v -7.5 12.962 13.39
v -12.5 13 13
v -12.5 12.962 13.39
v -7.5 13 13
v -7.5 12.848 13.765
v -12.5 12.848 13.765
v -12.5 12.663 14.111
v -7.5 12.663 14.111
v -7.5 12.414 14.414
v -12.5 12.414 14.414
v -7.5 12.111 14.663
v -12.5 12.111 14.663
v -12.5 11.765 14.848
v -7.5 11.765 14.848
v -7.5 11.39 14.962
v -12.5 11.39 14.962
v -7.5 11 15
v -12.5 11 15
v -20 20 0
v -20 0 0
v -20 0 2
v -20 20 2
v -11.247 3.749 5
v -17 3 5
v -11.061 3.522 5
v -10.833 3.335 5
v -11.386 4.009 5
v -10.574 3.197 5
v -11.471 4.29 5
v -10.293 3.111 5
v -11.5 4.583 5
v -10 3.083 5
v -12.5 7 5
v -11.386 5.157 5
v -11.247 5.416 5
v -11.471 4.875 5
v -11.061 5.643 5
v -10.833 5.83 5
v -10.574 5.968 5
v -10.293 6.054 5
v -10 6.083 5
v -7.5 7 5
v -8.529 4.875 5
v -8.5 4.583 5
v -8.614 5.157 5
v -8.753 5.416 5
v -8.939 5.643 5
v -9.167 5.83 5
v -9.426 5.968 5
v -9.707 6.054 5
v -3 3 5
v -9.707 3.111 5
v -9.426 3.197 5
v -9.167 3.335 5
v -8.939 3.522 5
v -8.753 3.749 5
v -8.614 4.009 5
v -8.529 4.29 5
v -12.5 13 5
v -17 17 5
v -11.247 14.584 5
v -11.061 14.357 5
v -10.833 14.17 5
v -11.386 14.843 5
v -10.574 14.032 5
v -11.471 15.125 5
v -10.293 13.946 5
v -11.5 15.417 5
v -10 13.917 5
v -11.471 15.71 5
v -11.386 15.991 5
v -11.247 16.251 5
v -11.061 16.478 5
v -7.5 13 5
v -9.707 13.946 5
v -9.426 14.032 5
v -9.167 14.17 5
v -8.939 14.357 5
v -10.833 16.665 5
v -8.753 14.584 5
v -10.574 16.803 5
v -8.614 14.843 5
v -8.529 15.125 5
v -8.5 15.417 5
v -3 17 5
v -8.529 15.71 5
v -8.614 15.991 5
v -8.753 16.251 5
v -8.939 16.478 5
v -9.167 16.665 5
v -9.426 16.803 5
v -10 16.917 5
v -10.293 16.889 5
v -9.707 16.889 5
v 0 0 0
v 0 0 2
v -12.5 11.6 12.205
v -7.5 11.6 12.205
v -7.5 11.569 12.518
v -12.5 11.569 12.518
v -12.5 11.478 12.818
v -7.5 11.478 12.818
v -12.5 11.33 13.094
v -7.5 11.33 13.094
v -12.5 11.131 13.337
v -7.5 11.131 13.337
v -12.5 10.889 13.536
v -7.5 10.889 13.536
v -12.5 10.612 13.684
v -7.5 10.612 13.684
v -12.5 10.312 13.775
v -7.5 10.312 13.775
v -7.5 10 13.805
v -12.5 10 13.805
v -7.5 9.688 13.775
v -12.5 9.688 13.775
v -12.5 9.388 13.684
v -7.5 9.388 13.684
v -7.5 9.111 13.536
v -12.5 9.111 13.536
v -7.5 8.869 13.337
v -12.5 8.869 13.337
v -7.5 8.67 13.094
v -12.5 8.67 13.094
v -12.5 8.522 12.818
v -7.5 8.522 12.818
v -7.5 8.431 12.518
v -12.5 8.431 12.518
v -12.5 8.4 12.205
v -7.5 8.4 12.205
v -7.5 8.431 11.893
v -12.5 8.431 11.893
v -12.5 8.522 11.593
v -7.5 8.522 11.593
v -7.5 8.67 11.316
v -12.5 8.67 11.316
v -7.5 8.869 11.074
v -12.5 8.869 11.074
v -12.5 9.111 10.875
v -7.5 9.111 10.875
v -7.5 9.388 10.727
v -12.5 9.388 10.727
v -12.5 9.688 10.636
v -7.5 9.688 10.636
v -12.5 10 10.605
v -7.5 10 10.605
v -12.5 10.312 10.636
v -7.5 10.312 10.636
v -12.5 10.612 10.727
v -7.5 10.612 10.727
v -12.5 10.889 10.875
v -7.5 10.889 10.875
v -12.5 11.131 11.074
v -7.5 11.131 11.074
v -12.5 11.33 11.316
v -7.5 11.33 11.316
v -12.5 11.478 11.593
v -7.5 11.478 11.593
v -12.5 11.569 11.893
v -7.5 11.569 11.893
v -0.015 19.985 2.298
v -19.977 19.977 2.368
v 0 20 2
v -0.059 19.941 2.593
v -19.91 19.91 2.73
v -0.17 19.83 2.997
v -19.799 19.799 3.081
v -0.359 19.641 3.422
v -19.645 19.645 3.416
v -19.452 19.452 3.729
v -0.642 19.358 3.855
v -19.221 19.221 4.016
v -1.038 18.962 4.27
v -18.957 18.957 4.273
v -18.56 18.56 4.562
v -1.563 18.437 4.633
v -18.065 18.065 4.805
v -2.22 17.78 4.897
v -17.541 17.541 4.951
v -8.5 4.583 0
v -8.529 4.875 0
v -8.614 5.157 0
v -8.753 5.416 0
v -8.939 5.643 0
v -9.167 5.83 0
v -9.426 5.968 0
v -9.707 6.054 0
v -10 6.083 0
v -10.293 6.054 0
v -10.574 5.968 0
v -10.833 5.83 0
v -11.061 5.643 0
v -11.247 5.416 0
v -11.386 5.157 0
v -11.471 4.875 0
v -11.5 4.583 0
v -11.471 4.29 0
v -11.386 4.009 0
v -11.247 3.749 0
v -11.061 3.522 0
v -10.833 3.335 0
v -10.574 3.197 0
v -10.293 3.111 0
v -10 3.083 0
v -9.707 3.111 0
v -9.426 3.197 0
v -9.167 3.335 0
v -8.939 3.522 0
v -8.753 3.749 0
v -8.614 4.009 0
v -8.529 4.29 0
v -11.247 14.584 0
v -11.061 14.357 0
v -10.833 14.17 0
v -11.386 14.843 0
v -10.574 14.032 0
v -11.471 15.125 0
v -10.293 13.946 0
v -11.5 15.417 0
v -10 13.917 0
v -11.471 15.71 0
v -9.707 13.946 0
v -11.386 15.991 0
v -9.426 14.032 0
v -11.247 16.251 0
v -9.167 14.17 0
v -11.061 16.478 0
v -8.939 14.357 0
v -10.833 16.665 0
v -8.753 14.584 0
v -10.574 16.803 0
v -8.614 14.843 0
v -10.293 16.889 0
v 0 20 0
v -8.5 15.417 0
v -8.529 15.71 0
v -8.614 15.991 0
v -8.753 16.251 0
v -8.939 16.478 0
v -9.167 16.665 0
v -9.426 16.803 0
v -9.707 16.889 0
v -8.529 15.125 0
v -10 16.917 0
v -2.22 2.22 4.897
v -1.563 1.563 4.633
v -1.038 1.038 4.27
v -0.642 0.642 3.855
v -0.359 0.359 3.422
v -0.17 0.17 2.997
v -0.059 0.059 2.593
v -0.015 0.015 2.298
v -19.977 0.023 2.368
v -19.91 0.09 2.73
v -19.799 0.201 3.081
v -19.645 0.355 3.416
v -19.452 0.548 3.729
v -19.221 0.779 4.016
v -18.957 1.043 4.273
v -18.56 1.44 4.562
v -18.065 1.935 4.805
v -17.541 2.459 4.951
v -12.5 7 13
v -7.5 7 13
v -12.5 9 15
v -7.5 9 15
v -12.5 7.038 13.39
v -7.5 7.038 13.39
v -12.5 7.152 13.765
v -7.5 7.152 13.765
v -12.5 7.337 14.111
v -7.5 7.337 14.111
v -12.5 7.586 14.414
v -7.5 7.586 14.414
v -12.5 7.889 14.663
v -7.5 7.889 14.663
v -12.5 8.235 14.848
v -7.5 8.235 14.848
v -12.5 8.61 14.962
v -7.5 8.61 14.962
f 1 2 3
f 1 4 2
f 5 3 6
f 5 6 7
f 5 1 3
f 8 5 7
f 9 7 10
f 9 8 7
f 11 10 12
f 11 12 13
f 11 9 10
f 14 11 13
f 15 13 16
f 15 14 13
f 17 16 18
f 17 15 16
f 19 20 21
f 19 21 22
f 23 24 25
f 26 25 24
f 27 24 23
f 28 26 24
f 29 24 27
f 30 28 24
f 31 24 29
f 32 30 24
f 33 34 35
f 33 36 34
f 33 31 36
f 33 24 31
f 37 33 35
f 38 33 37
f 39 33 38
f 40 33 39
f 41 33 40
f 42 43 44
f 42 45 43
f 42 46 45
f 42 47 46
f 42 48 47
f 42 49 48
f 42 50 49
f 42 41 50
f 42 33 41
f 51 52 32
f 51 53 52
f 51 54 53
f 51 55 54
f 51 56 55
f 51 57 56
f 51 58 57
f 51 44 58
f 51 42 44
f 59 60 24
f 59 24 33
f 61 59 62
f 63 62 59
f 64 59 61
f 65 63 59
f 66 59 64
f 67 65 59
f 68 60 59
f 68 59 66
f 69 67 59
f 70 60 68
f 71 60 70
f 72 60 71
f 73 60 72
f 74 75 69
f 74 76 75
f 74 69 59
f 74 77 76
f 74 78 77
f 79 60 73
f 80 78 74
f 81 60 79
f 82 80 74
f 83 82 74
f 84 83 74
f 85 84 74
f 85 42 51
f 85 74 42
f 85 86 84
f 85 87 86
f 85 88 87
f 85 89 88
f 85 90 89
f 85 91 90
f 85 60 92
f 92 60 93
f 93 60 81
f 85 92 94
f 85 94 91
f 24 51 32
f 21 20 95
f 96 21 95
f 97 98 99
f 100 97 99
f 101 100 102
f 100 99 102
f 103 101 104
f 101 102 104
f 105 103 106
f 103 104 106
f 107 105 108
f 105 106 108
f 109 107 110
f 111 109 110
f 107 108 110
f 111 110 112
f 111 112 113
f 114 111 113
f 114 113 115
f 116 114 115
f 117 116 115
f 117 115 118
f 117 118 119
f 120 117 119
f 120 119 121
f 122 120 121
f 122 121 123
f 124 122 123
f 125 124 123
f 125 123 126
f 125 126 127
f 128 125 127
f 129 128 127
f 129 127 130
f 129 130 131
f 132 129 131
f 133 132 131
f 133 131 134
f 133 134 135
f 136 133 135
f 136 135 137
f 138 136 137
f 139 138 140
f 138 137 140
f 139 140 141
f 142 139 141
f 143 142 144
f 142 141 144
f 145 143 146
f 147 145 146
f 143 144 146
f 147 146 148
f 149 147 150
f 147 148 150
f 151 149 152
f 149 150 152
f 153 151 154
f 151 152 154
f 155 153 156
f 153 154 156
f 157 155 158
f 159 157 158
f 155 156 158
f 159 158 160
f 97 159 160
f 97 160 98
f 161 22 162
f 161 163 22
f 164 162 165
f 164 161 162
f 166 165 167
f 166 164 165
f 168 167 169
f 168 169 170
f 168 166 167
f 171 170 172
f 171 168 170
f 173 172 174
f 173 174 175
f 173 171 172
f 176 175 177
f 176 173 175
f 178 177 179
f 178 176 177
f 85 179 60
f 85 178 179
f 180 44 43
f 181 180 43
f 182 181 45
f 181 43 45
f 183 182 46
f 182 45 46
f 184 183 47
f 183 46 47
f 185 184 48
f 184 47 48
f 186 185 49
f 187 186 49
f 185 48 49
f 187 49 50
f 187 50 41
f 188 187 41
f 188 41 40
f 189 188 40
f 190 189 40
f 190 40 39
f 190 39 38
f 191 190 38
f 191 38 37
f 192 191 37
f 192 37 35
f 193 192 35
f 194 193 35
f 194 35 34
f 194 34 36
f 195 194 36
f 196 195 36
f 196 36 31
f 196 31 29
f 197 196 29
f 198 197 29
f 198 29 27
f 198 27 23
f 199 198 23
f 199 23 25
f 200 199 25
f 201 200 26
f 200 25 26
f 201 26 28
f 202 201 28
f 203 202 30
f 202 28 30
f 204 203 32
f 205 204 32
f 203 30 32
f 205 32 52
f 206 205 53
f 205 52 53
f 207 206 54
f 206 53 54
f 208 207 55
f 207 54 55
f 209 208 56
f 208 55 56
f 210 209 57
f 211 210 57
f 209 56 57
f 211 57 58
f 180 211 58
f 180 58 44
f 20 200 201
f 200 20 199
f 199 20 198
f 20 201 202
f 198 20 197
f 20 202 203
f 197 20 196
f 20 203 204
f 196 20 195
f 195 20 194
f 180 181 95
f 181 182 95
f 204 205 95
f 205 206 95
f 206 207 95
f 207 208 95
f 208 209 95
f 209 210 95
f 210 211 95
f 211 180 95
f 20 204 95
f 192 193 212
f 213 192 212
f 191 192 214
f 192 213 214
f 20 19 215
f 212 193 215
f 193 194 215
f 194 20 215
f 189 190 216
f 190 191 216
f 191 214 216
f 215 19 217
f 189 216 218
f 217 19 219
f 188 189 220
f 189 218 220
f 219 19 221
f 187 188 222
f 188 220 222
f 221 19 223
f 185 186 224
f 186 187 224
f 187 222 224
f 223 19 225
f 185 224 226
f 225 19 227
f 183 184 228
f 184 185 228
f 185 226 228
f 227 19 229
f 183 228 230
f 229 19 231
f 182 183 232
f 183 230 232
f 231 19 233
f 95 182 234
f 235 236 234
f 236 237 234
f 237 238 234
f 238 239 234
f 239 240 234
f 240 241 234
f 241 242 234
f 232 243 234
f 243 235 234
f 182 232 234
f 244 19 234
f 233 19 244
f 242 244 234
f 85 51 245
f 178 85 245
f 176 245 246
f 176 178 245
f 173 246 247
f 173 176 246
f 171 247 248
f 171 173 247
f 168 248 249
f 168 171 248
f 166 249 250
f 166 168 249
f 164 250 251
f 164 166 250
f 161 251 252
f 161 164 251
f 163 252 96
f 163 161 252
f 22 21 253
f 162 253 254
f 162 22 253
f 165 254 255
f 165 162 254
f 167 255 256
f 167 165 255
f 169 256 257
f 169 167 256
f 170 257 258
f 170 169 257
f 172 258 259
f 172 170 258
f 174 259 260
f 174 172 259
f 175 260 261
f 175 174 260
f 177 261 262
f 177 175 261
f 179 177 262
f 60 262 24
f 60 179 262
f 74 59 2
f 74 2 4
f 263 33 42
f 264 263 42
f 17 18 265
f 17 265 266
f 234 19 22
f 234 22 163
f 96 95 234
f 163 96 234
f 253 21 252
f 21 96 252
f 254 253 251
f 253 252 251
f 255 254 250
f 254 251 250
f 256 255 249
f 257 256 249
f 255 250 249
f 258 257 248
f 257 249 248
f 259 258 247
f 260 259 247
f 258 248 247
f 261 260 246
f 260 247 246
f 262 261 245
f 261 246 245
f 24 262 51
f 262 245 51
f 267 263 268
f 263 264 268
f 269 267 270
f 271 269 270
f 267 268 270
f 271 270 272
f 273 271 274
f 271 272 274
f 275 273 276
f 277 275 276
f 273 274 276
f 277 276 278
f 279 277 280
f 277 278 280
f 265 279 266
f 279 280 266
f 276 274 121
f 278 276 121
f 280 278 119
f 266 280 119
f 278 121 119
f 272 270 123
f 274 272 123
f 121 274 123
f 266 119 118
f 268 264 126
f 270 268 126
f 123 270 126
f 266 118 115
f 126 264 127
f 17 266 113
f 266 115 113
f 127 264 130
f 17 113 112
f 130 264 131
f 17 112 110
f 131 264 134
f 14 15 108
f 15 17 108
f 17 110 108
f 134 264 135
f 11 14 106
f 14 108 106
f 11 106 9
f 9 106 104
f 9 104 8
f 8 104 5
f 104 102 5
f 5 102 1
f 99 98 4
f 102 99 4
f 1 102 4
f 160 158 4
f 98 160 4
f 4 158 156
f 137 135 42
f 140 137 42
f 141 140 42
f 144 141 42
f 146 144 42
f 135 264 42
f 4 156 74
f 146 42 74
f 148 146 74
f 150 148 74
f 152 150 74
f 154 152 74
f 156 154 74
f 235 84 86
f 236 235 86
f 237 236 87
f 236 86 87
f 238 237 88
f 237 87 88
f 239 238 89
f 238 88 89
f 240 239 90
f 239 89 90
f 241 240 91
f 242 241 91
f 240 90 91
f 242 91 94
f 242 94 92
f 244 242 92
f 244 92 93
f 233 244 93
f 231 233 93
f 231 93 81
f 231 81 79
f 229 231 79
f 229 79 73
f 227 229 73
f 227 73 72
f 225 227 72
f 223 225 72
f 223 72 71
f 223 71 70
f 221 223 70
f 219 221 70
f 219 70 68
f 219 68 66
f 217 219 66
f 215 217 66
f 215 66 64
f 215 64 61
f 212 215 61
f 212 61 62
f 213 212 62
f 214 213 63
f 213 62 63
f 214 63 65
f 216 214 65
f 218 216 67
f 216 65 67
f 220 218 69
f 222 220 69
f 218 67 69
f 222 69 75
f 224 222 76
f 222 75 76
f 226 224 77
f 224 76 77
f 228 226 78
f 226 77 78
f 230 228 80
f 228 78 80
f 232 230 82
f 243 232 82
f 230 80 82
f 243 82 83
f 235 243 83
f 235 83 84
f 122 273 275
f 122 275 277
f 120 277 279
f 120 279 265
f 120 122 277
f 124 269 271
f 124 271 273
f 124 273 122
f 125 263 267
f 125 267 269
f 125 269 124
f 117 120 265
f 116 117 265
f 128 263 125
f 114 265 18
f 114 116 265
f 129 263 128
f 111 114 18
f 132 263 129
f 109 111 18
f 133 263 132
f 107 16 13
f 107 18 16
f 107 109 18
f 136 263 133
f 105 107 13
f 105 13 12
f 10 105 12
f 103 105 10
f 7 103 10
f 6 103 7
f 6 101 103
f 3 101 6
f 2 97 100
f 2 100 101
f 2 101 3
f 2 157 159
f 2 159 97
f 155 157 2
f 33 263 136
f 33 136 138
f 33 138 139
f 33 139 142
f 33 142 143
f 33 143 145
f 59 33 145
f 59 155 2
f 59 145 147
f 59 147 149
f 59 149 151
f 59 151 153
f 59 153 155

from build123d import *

# Parameters (mm, degrees)
SKETCH_W        = 20
SKETCH_H        = 20
PAD_DEPTH       = 5
SKETCH001_W     = 5
SKETCH001_H     = 6
PAD001_DEPTH    = 10
SKETCH002_R     = 1.6
POCKET_DEPTH    = 12.501
SKETCH003_R     = 1.5
POCKET001_DEPTH = 5.001
FILLET_R        = 3
FILLET001_R     = 2


with BuildPart() as part:
    # Sketch → Pad (new body)
    with BuildSketch(Plane.XY):
        with Locations((-10, 10)):
            Rectangle(SKETCH_W, SKETCH_H)
    extrude(amount=PAD_DEPTH)

    # Sketch001 (on Face6 of Pad) → Pad001 (join)
    with BuildSketch(Plane.XY.offset(5)):
        with Locations((-10, 10)):
            Rectangle(SKETCH001_W, SKETCH001_H)
    extrude(amount=PAD001_DEPTH)

    # Sketch002 (on Face8 of Pad001) → Pocket (cut, through all)
    with BuildSketch(Plane.YZ.offset(-7.5)):
        with Locations((10, 12.205362)):
            Circle(SKETCH002_R)
    extrude(amount=-POCKET_DEPTH, mode=Mode.SUBTRACT)

    # Sketch003 (on Face5 of Pocket) → Pocket001 (cut, through all)
    with BuildSketch(Plane.XY.offset(5)):
        with Locations((-10, 15.417424)):
            Circle(SKETCH003_R)
        with Locations((-10, 4.582576)):
            Circle(SKETCH003_R)
    extrude(amount=-POCKET001_DEPTH, mode=Mode.SUBTRACT)

    # Fillet
    fillet_edges = [part.edges().sort_by_distance(p)[0] for p in [
        (0, 10, 5),
        (-10, 0, 5),
        (-20, 10, 5),
        (-10, 20, 5),
    ]]
    fillet(fillet_edges, radius=FILLET_R)

    # Fillet001
    fillet001_edges = [part.edges().sort_by_distance(p)[0] for p in [
        (-10, 7, 15),
        (-10, 13, 15),
    ]]
    fillet(fillet001_edges, radius=FILLET001_R)


solid = part.part
